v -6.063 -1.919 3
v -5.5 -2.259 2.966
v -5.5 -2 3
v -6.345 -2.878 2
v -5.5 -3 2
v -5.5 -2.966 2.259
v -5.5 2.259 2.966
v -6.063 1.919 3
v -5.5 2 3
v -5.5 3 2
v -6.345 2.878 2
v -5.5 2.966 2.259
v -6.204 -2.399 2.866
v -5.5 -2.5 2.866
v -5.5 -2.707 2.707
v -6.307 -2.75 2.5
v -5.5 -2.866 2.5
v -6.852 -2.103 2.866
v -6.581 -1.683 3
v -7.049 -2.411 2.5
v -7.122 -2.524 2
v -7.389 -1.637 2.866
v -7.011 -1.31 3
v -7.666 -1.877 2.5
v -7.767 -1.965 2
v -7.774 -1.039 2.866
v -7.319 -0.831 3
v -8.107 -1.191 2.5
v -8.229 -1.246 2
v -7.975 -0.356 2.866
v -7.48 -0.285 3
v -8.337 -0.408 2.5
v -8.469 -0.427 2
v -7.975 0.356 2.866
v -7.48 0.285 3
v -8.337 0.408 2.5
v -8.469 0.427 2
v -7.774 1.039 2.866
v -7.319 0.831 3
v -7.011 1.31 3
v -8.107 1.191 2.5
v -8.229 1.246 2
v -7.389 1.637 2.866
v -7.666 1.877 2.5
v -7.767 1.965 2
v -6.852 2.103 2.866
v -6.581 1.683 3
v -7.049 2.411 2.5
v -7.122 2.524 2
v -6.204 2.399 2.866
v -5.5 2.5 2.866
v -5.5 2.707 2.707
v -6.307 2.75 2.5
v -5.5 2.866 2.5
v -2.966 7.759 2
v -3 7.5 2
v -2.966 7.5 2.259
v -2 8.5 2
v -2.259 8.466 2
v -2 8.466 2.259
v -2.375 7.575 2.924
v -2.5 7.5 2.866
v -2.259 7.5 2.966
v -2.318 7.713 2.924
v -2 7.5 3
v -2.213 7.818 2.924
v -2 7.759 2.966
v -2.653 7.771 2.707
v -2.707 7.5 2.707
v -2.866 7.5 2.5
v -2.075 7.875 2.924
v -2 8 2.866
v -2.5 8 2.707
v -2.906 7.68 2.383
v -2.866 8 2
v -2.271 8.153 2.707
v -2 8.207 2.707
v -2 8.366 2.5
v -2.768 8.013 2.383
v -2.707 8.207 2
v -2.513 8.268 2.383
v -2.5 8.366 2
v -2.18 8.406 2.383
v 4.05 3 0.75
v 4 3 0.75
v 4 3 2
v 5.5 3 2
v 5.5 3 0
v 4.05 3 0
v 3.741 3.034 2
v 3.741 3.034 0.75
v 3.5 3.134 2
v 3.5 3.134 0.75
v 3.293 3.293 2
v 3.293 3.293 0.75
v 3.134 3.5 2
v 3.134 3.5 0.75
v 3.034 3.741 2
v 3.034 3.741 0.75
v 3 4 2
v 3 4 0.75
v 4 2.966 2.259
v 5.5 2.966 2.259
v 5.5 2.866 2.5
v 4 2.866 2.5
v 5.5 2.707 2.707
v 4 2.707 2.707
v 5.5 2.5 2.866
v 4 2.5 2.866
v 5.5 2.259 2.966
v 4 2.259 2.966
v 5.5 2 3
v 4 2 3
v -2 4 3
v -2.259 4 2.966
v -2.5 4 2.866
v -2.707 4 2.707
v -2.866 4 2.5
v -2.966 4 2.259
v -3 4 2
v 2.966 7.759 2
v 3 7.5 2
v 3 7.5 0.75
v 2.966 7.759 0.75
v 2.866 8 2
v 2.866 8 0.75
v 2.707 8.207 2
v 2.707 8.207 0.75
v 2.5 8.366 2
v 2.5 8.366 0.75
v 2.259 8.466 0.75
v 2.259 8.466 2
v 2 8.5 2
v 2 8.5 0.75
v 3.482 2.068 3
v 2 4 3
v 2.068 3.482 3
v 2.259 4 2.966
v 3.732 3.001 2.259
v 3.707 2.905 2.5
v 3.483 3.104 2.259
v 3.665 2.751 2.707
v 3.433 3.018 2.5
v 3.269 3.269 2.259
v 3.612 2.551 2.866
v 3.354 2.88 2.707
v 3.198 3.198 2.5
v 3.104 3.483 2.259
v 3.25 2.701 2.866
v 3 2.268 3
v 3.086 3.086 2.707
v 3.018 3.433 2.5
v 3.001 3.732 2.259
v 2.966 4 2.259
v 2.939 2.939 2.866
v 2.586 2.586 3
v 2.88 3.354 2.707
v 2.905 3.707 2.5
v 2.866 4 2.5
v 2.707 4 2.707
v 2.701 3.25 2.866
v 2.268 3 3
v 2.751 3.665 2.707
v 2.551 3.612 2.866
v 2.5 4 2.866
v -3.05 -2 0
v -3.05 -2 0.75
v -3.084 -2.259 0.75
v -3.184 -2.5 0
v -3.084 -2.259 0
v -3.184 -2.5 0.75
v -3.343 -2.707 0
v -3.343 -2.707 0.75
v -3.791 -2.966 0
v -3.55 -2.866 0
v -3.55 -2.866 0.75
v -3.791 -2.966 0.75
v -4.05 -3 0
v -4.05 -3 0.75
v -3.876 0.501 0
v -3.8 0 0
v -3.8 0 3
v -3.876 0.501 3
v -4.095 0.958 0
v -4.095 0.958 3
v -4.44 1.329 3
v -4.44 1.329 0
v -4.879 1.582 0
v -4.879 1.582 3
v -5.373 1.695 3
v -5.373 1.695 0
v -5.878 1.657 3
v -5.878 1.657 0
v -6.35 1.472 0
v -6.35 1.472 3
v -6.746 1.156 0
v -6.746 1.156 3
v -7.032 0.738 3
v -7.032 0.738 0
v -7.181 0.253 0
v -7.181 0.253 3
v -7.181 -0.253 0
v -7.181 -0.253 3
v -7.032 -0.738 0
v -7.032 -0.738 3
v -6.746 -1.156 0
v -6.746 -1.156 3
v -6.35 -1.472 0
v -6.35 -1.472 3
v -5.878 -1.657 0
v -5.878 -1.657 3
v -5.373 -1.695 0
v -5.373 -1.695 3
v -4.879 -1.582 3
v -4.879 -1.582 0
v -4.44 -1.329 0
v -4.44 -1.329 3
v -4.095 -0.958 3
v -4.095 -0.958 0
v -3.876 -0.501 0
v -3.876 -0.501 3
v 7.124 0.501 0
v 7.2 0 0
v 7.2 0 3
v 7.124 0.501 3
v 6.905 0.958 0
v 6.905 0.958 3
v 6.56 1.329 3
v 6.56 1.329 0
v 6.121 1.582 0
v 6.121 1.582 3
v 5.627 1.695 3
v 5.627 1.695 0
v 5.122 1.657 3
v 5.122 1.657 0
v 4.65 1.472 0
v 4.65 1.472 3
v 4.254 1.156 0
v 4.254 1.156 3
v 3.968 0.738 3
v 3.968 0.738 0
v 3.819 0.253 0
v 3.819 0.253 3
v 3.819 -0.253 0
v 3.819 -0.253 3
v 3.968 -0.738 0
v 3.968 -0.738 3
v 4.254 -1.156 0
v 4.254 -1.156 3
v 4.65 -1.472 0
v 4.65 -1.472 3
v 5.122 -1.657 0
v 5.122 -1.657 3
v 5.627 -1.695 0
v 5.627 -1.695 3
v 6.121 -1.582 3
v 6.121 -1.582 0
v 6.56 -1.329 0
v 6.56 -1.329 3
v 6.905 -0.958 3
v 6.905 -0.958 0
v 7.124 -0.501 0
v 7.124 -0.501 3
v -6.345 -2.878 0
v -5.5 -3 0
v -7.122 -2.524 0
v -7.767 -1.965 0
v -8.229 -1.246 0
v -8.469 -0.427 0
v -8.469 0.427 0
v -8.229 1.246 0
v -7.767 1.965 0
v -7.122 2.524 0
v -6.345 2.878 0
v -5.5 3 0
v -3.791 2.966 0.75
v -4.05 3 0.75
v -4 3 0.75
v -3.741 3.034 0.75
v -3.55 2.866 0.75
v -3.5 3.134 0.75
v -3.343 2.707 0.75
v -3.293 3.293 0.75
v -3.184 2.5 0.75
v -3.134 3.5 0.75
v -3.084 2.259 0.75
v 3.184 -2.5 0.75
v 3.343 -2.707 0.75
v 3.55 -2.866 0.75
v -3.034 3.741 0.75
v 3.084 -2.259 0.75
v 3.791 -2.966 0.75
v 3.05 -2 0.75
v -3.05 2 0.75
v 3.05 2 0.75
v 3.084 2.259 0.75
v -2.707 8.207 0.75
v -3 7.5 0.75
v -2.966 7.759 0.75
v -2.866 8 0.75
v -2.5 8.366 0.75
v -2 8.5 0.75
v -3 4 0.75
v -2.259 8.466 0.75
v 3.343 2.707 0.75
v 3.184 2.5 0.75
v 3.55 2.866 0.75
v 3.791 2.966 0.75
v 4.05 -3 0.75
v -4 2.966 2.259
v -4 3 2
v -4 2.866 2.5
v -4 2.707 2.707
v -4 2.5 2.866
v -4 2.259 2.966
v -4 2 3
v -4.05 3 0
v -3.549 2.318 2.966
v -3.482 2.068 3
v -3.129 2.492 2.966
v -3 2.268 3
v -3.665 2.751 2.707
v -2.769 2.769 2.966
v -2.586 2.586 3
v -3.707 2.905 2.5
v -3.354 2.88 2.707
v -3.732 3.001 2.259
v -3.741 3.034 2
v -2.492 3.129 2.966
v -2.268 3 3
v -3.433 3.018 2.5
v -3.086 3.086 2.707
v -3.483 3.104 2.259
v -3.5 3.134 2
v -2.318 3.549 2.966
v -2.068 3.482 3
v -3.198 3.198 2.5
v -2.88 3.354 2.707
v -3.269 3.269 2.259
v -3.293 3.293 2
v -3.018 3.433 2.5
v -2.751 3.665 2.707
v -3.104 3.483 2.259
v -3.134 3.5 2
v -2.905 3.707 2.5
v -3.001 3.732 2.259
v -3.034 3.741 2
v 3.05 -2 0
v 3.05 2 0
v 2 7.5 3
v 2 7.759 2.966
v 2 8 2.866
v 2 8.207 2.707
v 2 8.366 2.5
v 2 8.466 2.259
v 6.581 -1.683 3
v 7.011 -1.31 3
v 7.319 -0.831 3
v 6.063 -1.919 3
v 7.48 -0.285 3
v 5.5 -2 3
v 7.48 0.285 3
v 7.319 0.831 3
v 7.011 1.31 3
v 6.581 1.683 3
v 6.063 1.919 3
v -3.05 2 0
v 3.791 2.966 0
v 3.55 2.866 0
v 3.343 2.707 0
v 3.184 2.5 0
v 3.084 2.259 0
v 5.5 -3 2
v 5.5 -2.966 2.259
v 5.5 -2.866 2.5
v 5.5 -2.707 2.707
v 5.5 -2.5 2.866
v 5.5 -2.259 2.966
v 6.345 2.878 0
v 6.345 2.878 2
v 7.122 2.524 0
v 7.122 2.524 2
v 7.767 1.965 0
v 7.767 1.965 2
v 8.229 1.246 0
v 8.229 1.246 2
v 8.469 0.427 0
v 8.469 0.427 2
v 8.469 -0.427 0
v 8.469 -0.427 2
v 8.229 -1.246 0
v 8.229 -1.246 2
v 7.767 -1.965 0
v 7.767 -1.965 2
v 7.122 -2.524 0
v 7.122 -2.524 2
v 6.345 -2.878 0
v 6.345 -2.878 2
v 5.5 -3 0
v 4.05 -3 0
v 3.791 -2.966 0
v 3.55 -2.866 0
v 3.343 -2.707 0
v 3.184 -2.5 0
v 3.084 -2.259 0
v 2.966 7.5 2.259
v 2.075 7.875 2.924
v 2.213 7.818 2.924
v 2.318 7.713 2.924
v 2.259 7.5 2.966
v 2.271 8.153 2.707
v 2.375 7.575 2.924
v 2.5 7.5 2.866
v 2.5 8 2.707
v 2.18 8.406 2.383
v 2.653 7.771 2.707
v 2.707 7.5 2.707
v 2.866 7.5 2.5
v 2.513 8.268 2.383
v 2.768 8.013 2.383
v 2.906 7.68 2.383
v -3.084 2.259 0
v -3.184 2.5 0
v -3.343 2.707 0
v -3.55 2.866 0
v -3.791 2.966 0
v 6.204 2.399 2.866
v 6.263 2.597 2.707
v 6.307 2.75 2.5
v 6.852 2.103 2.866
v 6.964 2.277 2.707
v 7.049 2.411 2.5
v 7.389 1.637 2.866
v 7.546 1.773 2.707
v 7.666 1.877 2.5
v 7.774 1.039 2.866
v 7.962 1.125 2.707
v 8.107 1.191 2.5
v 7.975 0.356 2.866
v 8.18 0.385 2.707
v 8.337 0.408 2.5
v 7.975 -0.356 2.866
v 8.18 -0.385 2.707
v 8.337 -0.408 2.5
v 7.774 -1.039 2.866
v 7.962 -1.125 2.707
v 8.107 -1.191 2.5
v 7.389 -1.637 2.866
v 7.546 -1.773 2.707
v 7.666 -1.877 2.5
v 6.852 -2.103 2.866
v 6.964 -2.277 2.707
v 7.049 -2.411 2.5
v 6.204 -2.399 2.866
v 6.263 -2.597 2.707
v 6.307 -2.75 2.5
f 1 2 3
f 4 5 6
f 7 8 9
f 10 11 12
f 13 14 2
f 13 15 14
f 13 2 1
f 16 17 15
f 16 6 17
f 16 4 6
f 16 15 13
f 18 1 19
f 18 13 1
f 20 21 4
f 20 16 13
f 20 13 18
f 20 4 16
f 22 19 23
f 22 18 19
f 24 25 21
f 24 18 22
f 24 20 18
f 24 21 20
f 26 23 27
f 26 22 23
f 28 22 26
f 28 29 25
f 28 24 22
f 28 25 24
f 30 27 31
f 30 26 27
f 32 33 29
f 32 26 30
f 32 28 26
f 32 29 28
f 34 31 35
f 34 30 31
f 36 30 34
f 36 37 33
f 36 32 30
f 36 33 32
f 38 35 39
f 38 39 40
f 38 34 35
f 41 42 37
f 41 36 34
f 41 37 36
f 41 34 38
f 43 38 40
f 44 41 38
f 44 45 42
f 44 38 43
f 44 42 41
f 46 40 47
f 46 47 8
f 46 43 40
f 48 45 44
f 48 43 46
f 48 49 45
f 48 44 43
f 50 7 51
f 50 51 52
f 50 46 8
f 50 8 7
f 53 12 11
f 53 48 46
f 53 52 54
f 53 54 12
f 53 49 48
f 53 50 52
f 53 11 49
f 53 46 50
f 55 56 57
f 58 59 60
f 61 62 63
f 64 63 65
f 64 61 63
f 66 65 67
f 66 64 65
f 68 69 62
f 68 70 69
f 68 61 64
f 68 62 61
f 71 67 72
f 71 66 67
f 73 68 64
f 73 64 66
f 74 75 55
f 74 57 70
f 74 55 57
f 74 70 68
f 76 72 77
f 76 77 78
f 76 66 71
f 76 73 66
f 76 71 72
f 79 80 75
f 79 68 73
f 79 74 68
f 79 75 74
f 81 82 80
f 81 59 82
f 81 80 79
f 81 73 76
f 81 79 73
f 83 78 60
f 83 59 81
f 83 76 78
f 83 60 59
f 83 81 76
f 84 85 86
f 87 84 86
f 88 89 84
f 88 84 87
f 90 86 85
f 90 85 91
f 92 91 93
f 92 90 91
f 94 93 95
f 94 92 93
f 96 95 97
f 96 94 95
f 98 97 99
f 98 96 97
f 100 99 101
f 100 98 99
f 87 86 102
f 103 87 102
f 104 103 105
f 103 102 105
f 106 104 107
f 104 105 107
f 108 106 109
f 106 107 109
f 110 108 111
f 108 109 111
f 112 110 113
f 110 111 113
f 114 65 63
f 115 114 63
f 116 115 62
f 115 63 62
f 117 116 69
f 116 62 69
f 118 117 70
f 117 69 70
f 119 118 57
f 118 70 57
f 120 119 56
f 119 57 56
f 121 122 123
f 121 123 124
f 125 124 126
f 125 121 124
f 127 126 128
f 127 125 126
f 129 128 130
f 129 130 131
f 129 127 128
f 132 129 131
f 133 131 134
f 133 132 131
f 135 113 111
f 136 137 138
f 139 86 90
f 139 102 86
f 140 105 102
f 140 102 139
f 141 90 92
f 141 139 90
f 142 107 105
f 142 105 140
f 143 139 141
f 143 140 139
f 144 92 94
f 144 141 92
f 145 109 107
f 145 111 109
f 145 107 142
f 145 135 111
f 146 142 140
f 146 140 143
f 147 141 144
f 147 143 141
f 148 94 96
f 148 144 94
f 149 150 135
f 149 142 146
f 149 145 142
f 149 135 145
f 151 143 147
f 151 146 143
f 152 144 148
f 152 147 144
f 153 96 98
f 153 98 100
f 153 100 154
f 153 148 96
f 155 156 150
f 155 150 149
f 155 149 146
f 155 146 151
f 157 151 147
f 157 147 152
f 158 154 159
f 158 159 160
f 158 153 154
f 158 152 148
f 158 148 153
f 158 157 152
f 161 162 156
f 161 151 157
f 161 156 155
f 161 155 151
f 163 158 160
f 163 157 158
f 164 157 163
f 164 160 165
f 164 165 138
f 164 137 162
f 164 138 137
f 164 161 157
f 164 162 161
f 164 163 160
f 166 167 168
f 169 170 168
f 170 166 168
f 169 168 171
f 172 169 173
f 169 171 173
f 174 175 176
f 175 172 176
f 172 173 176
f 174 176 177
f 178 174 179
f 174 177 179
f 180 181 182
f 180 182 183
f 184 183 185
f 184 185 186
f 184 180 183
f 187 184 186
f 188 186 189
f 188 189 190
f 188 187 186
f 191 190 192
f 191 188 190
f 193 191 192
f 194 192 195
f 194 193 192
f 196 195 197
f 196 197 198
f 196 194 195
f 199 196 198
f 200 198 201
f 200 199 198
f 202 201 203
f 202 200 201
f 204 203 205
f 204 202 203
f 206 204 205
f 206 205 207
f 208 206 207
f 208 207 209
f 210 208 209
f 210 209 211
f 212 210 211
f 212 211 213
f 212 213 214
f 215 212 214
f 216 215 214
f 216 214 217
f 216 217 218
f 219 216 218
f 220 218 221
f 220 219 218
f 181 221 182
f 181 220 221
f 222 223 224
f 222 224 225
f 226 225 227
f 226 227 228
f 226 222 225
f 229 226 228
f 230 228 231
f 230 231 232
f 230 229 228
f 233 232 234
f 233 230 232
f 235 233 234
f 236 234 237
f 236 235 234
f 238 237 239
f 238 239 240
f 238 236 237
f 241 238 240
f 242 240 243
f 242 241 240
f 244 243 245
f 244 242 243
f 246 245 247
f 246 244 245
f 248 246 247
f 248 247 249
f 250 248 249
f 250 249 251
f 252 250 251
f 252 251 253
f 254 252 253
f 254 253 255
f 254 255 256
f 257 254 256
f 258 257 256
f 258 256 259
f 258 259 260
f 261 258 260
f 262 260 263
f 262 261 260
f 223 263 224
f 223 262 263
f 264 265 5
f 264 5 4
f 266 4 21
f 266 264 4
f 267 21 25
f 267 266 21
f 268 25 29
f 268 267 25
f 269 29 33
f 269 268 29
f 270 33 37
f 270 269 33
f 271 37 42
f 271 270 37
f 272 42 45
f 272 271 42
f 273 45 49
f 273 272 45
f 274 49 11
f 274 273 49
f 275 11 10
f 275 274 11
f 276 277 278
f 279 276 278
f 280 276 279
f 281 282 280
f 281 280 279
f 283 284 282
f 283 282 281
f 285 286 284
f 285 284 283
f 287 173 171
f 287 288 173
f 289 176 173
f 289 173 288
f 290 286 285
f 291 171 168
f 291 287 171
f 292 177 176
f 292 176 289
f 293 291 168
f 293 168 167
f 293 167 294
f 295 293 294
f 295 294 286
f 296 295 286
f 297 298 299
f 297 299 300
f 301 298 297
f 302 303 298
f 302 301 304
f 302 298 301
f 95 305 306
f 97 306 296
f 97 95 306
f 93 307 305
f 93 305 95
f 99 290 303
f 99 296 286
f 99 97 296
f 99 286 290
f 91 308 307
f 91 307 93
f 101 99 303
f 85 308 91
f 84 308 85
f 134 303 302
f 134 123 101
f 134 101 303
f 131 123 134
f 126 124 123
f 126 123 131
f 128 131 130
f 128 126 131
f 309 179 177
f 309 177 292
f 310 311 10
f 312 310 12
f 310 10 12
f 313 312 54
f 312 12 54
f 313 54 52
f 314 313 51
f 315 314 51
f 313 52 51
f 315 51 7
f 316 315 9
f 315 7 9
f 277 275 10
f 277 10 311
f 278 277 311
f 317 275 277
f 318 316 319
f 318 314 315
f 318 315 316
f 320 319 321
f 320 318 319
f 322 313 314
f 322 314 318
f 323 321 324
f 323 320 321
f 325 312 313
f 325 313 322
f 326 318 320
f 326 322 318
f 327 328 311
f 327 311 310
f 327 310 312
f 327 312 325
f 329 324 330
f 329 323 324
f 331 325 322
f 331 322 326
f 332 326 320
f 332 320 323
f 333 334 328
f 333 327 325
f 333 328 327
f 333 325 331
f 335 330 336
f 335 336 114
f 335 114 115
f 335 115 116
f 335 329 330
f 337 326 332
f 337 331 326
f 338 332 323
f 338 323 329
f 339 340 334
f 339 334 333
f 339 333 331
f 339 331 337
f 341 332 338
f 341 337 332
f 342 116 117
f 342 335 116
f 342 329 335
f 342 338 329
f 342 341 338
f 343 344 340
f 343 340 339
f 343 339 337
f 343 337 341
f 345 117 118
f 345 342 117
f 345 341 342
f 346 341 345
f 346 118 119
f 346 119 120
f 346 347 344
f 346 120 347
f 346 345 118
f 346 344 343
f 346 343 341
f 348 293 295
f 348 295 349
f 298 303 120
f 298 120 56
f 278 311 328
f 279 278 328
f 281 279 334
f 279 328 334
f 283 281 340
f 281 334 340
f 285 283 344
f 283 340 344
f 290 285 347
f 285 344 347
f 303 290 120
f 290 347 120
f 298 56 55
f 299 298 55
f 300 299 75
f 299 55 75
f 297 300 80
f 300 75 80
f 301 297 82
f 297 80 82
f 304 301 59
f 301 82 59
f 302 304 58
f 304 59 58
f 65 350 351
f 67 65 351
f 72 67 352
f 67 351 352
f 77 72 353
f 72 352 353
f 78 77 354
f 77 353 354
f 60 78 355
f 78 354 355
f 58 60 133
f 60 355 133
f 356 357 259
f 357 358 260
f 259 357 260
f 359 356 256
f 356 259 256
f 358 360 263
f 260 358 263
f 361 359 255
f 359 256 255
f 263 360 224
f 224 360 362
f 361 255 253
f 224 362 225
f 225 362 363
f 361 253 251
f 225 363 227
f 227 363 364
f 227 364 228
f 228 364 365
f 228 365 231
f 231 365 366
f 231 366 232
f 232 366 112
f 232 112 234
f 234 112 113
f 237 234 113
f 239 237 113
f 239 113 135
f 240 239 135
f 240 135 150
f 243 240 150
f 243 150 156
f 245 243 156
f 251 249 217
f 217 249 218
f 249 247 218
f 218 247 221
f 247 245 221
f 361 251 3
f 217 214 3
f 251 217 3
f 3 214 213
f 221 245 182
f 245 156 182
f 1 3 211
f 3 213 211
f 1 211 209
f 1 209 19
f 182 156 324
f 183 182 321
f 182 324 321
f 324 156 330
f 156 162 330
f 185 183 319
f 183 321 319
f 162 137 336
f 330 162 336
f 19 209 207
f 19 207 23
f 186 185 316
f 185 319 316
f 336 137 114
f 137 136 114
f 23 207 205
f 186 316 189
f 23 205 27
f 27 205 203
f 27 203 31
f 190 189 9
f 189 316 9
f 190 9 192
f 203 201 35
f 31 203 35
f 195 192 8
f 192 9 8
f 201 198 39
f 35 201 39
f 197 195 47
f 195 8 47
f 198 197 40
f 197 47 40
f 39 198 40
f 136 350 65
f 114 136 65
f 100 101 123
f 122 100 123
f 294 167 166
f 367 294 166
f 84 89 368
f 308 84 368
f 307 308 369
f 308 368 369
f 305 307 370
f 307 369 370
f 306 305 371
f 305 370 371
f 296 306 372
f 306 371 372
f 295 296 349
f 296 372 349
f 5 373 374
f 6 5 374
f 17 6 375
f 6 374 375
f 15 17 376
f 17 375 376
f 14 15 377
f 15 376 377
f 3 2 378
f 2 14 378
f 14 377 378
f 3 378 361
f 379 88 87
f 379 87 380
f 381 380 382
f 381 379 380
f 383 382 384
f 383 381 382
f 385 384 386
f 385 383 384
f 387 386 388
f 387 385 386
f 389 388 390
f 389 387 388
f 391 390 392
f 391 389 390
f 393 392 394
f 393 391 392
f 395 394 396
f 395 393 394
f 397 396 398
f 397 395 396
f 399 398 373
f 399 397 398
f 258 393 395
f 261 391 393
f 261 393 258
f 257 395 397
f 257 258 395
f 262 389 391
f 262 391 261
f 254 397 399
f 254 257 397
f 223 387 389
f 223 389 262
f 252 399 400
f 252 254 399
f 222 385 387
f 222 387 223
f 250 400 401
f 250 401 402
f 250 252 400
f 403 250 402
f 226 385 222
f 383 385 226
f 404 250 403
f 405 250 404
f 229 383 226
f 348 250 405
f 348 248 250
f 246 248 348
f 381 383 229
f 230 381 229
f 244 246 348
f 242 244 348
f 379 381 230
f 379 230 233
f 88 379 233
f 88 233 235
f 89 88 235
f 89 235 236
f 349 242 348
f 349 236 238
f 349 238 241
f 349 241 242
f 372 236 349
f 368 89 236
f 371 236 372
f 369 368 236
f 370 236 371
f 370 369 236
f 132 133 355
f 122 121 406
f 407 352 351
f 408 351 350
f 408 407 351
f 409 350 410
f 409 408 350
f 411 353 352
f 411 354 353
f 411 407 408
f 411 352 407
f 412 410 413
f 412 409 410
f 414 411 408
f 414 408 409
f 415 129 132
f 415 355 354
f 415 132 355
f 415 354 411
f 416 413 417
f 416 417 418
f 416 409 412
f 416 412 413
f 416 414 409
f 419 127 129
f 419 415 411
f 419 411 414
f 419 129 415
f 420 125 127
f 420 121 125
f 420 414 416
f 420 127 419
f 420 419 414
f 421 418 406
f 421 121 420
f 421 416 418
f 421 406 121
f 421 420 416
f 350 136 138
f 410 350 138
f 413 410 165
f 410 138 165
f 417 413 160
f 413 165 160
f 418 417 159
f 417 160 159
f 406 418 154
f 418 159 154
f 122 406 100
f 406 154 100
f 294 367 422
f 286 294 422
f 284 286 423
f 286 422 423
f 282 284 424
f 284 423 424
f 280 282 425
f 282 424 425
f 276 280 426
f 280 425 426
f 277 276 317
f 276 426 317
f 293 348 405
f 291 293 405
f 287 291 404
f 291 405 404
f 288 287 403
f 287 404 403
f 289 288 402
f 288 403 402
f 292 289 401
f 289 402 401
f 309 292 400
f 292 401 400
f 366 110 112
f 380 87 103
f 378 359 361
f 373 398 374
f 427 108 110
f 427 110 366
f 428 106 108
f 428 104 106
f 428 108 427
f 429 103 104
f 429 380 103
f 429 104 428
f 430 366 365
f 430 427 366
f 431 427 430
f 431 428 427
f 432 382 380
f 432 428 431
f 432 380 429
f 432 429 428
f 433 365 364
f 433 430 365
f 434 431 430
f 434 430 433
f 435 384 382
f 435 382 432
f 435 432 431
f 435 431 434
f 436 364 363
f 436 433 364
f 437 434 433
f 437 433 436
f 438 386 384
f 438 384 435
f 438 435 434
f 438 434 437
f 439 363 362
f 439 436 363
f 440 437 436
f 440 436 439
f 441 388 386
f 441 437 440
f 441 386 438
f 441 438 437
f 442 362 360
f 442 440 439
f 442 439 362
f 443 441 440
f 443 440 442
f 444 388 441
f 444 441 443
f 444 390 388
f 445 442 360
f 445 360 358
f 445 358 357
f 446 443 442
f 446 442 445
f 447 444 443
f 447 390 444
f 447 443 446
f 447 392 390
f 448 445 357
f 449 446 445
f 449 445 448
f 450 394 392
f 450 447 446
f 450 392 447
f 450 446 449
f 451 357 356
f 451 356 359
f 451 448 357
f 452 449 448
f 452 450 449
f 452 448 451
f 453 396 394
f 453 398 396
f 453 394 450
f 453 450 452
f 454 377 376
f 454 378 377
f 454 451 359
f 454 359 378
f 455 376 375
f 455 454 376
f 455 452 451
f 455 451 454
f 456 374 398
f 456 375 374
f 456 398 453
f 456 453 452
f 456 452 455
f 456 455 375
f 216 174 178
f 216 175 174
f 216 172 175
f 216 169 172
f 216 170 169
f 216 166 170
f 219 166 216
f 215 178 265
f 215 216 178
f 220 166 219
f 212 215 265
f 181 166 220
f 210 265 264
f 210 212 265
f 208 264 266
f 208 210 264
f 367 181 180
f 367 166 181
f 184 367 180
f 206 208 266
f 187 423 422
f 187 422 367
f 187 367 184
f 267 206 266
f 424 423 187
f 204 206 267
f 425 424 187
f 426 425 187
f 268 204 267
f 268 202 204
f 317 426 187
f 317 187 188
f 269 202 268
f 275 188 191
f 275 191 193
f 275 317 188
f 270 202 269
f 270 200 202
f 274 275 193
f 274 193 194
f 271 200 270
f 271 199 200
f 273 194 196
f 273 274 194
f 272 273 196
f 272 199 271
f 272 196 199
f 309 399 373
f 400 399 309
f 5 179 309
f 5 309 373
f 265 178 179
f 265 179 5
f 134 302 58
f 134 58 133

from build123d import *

# Parameters (mm, degrees)
SKETCH1_R               = 1.7
SKETCH1_W               = 6
SKETCH1_H               = 5.5
BOSS_EXTRUDE1_DEPTH     = 3
CUT_EXTRUDE1_DEPTH      = 13.389511693
CUT_EXTRUDE1_DEPTH_BACK = 13.389511693
SKETCH2_W               = 6.1
SKETCH2_H               = 0.75
FILLET2_R               = 1
FILLET1_R               = 1


with BuildPart() as part:
    # Sketch1 → Boss-Extrude1 (new body)
    # profile 1 of 2: a face of its own
    with BuildSketch(Plane.XY):
        with BuildLine():
            Line((-5.5, 3), (5.5, 3))
            ThreePointArc((5.5, 3), (8.5, 0), (5.5, -3))
            Line((5.5, -3), (-5.5, -3))
            ThreePointArc((-5.5, -3), (-8.5, 0), (-5.5, 3))
        make_face()
        with Locations((5.5, 0)):
            Circle(SKETCH1_R, mode=Mode.SUBTRACT)
        with Locations((-5.5, 0)):
            Circle(SKETCH1_R, mode=Mode.SUBTRACT)
    # profile 2 of 2: a face of its own
    with BuildSketch(Plane.XY):
        with Locations((0, 5.75)):
            Rectangle(SKETCH1_W, SKETCH1_H)
    extrude(amount=BOSS_EXTRUDE1_DEPTH)

    # Sketch2 → Cut-Extrude1 (cut, two sides: drawn at the far end of the back side and taken through both)
    with BuildSketch(Plane(origin=(0, 0, 0), x_dir=(1, 0, 0), z_dir=(0, 1, 0)).offset(-CUT_EXTRUDE1_DEPTH_BACK)):
        with Locations((0, -0.375)):
            Rectangle(SKETCH2_W, SKETCH2_H)
    extrude(amount=CUT_EXTRUDE1_DEPTH + CUT_EXTRUDE1_DEPTH_BACK, mode=Mode.SUBTRACT)

    # Fillet2
    fillet2_edges = [part.edges().sort_by_distance(p)[0] for p in [
        (3, 3, 1.875),
        (-3, 3, 1.875),
        (3, 8.5, 1.875),
        (-3, 8.5, 1.875),
    ]]
    fillet(fillet2_edges, radius=FILLET2_R)

    # Fillet1
    # the kernel refuses this fillet: 1 mm, written as the material it takes off along each edge
    with BuildSketch(Plane(origin=(-5.5, 0, 3), x_dir=(0, -1, 0), z_dir=(1, 0, 0))) as fillet1_piece_1:
        with BuildLine():
            CenterArc((3 - FILLET1_R, FILLET1_R), FILLET1_R, 270, 90)
            Line((3, FILLET1_R), (3, 0))
            Line((3, 0), (3 - FILLET1_R, 0))
        make_face()
    revolve(axis=Axis((-5.5, 0, 3), (0, 0, -1)), revolution_arc=180, mode=Mode.SUBTRACT)
    with BuildSketch(Plane(origin=(5.5, -3, 3), x_dir=(0, 0, -1), z_dir=(-1, 0, 0))) as fillet1_piece_2:
        with BuildLine():
            CenterArc((FILLET1_R, -FILLET1_R), FILLET1_R, 90, 90)
            Line((0, -FILLET1_R), (0, 0))
            Line((0, 0), (FILLET1_R, 0))
        make_face()
    extrude(amount=11, mode=Mode.SUBTRACT)
    with BuildSketch(Plane(origin=(5.5, 0, 3), x_dir=(0, 1, 0), z_dir=(-1, 0, 0))) as fillet1_piece_3:
        with BuildLine():
            CenterArc((3 - FILLET1_R, FILLET1_R), FILLET1_R, 270, 90)
            Line((3 - FILLET1_R, 0), (3, 0))
            Line((3, 0), (3, FILLET1_R))
        make_face()
    revolve(axis=Axis((5.5, 0, 3), (0, 0, -1)), revolution_arc=180, mode=Mode.SUBTRACT)
    with BuildSketch(Plane(origin=(3.05, -3, -2.5), x_dir=(0, 1, 0), z_dir=(0, 0, 1))) as fillet1_piece_4:
        with BuildLine():
            CenterArc((FILLET1_R, -FILLET1_R), FILLET1_R, 90, 90)
            Line((0, -FILLET1_R), (0, 0))
            Line((0, 0), (FILLET1_R, 0))
        make_face()
    extrude(amount=3.25, mode=Mode.SUBTRACT)
    with BuildSketch(Plane(origin=(-3.05, -3, 0.75), x_dir=(-1, 0, 0), z_dir=(0, 0, -1))) as fillet1_piece_5:
        with BuildLine():
            CenterArc((FILLET1_R, FILLET1_R), FILLET1_R, 180, 90)
            Line((0, FILLET1_R), (0, 0))
            Line((0, 0), (FILLET1_R, 0))
        make_face()
    extrude(amount=3.25, mode=Mode.SUBTRACT)
    with BuildSketch(Plane(origin=(-5.5, 3, 3), x_dir=(0, -1, 0), z_dir=(1, 0, 0))) as fillet1_piece_6:
        with BuildLine():
            CenterArc((FILLET1_R, FILLET1_R), FILLET1_R, 180, 90)
            Line((0, FILLET1_R), (0, 0))
            Line((0, 0), (FILLET1_R, 0))
        make_face()
    extrude(amount=1.5, mode=Mode.SUBTRACT)
    with BuildSketch(Plane(origin=(4, 3, 3), x_dir=(0, 0, -1), z_dir=(1, 0, 0))) as fillet1_piece_7:
        with BuildLine():
            CenterArc((FILLET1_R, -FILLET1_R), FILLET1_R, 90, 90)
            Line((0, -FILLET1_R), (0, 0))
            Line((0, 0), (FILLET1_R, 0))
        make_face()
    extrude(amount=1.5, mode=Mode.SUBTRACT)
    with BuildSketch(Plane(origin=(4, 4, 3), x_dir=(0, -1, 0), z_dir=(1, 0, 0))) as fillet1_piece_8:
        with BuildLine():
            CenterArc((1 + FILLET1_R, FILLET1_R), FILLET1_R, 180, 90)
            Line((1 + FILLET1_R, 0), (1, 0))
            Line((1, 0), (1, FILLET1_R))
        make_face()
    revolve(axis=Axis((4, 4, 3), (0, 0, -1)), revolution_arc=90, mode=Mode.SUBTRACT)
    with BuildSketch(Plane(origin=(3, 4, 3), x_dir=(-1, 0, 0), z_dir=(0, 1, 0)), Plane(origin=(-3, 7.5, 3), x_dir=(1, 0, 0), z_dir=(0, -1, 0))) as fillet1_piece_9:
        with BuildLine():
            CenterArc((FILLET1_R, -FILLET1_R), FILLET1_R, 90, 90)
            Line((0, -FILLET1_R), (0, 0))
            Line((0, 0), (FILLET1_R, 0))
        make_face()
    extrude(amount=3.5, mode=Mode.SUBTRACT)
    with BuildSketch(Plane(origin=(2, 7.5, 3), x_dir=(0, 1, 0), z_dir=(-1, 0, 0))) as fillet1_piece_10:
        with BuildLine():
            CenterArc((1 - FILLET1_R, FILLET1_R), FILLET1_R, 270, 90)
            Line((1, FILLET1_R), (1, 0))
            Line((1, 0), (1 - FILLET1_R, 0))
        make_face()
    revolve(axis=Axis((2, 7.5, 3), (0, 0, -1)), revolution_arc=90, mode=Mode.SUBTRACT)
    with BuildSketch(Plane(origin=(2, 8.5, 3), x_dir=(0, -1, 0), z_dir=(-1, 0, 0))) as fillet1_piece_11:
        with BuildLine():
            CenterArc((FILLET1_R, -FILLET1_R), FILLET1_R, 90, 90)
            Line((0, -FILLET1_R), (0, 0))
            Line((0, 0), (FILLET1_R, 0))
        make_face()
    extrude(amount=4, mode=Mode.SUBTRACT)
    with BuildSketch(Plane(origin=(-2, 7.5, 3), x_dir=(-1, 0, 0), z_dir=(0, -1, 0))) as fillet1_piece_12:
        with BuildLine():
            CenterArc((1 - FILLET1_R, FILLET1_R), FILLET1_R, 270, 90)
            Line((1, FILLET1_R), (1, 0))
            Line((1, 0), (1 - FILLET1_R, 0))
        make_face()
    revolve(axis=Axis((-2, 7.5, 3), (0, 0, -1)), revolution_arc=90, mode=Mode.SUBTRACT)
    with BuildSketch(Plane(origin=(-4, 4, 3), x_dir=(0, -1, 0), z_dir=(-1, 0, 0))) as fillet1_piece_13:
        with BuildLine():
            CenterArc((1 + FILLET1_R, -FILLET1_R), FILLET1_R, 90, 90)
            Line((1, -FILLET1_R), (1, 0))
            Line((1, 0), (1 + FILLET1_R, 0))
        make_face()
    revolve(axis=Axis((-4, 4, 3), (0, 0, 1)), revolution_arc=90, mode=Mode.SUBTRACT)
    with BuildSketch(Plane(origin=(-3.05, 3.6877501, -4.21937525), x_dir=(0, -1, 0), z_dir=(0, 0, 1))) as fillet1_piece_14:
        with BuildLine():
            CenterArc((1.6877501, -1), FILLET1_R, 90, 90)
            Line((0.6877501, -1), (0.5877501, -1))
            ThreePointArc((0.5877501, -1), (0.5877501, -0.95), (-0.03122499, -0.095))
            Line((-0.03122499, -0.095), (0, 0.1))
            Line((0, 0.1), (1.6877501, 0.1))
            Line((1.6877501, 0.1), (1.6877501, 0))
        make_face()
    extrude(amount=4.96937525, mode=Mode.SUBTRACT)
    with BuildSketch(Plane(origin=(3.05, 3.6877501, -4.21937525), x_dir=(0.8239457103973873, -0.5666687447863566, 0), z_dir=(0, 0, 1))) as fillet1_piece_15:
        with BuildLine():
            CenterArc((1.780340941, -0.82394571), FILLET1_R, 124.51825235, 90)
            Line((0.956395231, -1.390614455), (0.87400066, -1.44728133))
            Line((0.87400066, -1.44728133), (-0.082394571, -0.056666874))
            Line((-0.082394571, -0.056666874), (0.060580617, 0.079561227))
            ThreePointArc((0.060580617, 0.079561227), (1.115808036, 0.054061134), (1.157005322, 0.082394571))
            Line((1.157005322, 0.082394571), (1.213672196, 0))
        make_face()
    extrude(amount=4.96937525, mode=Mode.SUBTRACT)


solid = part.part
